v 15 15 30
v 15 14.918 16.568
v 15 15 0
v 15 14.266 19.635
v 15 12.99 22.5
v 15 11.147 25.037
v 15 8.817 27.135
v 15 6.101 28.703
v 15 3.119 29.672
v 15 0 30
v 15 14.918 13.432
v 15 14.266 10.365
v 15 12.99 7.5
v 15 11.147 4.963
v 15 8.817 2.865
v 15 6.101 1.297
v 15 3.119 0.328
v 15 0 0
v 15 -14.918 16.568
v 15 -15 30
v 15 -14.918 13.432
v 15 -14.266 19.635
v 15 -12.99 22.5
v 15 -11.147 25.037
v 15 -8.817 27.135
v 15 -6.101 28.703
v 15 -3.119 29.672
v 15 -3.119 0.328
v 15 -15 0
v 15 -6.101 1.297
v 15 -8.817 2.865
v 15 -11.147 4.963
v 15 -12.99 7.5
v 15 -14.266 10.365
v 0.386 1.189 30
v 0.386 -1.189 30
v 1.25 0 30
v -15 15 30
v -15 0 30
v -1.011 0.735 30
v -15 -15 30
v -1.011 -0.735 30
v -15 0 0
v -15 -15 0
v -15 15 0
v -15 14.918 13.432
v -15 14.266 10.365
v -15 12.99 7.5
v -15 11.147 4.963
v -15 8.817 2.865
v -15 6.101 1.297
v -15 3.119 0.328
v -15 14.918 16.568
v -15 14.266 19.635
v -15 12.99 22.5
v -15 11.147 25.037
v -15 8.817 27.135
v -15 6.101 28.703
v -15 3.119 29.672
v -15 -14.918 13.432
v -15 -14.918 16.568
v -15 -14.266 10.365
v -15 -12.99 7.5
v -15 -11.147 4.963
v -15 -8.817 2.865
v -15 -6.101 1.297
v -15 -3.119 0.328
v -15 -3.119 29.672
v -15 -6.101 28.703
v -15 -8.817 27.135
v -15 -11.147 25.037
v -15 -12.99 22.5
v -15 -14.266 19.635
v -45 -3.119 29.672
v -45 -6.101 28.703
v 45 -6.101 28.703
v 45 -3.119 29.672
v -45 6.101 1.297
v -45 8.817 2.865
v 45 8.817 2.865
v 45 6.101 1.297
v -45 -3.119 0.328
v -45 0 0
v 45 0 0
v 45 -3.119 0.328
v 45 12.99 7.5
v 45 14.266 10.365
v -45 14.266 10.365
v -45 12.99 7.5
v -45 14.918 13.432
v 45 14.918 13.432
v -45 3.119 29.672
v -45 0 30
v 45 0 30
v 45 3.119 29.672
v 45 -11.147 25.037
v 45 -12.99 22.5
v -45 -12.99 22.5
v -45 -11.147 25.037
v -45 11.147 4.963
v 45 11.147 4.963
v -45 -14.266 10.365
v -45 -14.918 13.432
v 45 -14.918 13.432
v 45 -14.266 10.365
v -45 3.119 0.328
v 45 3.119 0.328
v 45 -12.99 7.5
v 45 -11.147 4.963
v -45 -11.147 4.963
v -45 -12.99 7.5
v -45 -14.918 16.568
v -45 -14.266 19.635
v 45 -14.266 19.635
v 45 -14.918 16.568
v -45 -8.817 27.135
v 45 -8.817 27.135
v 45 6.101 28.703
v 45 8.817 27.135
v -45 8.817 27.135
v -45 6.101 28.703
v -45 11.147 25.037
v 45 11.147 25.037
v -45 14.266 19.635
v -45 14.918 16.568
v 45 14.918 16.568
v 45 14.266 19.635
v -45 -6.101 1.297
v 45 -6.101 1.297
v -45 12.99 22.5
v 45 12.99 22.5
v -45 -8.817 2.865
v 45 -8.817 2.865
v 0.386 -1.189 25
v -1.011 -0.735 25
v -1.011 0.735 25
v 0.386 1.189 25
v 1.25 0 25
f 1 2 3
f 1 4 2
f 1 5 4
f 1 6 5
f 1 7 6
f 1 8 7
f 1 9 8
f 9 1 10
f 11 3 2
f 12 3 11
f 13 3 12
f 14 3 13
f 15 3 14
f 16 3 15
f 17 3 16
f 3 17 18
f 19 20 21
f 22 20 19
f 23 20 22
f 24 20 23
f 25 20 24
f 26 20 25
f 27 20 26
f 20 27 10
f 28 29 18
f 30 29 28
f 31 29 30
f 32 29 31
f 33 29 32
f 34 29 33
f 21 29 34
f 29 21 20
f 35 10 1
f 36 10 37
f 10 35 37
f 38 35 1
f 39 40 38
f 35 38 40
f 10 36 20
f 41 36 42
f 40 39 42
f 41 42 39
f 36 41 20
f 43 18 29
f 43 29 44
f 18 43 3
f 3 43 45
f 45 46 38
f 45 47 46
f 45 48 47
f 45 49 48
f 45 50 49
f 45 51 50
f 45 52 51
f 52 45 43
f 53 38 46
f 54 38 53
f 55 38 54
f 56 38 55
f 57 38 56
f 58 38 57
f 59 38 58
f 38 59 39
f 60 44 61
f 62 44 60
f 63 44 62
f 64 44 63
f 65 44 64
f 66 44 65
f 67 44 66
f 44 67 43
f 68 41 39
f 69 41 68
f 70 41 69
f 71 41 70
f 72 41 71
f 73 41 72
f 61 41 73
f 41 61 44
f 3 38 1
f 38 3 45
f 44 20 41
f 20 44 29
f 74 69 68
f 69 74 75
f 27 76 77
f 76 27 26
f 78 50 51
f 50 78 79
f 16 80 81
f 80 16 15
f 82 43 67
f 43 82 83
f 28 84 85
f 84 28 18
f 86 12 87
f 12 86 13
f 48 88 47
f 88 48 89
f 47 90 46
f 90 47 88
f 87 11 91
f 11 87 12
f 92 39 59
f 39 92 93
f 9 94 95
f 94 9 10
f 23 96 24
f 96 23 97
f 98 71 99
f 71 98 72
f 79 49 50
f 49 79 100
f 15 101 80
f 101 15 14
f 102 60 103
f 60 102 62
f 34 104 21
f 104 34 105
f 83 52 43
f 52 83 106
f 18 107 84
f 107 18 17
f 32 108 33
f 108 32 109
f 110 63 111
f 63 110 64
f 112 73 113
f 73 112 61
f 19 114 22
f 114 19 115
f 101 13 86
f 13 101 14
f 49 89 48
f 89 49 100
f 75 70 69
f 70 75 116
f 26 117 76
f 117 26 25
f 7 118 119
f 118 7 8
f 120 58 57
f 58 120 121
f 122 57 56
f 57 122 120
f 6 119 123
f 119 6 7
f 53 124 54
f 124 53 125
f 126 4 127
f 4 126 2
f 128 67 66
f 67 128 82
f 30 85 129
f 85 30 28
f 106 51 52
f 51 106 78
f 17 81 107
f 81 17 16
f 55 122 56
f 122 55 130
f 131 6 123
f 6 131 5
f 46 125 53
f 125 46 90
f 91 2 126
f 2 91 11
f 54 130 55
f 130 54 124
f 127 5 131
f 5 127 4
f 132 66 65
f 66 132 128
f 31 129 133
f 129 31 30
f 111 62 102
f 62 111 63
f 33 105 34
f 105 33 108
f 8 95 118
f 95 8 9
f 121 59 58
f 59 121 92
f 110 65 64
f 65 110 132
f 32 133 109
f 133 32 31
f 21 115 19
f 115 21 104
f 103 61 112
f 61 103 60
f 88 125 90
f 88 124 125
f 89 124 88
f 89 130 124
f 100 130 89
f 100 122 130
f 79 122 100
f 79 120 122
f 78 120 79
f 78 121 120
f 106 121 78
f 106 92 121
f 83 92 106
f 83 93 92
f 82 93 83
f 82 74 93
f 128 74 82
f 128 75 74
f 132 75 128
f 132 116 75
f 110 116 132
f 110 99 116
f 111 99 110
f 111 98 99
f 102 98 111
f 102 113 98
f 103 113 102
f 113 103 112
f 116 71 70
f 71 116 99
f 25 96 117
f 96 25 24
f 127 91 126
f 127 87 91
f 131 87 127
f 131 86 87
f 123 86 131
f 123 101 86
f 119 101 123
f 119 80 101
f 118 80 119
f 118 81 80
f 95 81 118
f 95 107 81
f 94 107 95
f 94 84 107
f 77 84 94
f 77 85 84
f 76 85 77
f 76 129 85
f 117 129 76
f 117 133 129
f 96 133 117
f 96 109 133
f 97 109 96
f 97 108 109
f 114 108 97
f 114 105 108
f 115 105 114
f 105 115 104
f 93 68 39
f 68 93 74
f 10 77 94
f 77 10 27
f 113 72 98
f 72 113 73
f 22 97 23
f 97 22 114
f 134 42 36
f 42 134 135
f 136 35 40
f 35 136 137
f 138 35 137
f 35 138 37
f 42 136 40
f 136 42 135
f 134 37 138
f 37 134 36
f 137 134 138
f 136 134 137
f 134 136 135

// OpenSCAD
cube_size = 30; // [10:Small,20:Medium,30:Large]

hole_diameter = 2.5; 
hole_radius = hole_diameter/2;

// How deep should the center hole be?
hole_depth = 5; // [0,1,5,50]

show_wheels = "yes"; // [yes,no]

// How thick should the side wheels be?
wheel_thickness = 30; // [1:40]

// ignore this variable!
// foo=1;

// don't turn functions into params!
function BEZ03(u) = pow((1-u), 3);

// ignore variable values
bing = 3+4;
baz = 3 / hole_depth;

difference() {
  union() {
    translate([0, 0, cube_size/2]) cube([cube_size,cube_size,cube_size], center=true);
    if (show_wheels == "yes") {
      translate([0, 0, cube_size/2]) rotate([0, 90, 0]) {
        cylinder(r=cube_size/2, h=cube_size+(wheel_thickness*2), center=true);
      }
    }
  }
  translate([0, 0, cube_size-hole_depth]) cylinder(r=hole_radius, h=hole_depth);
}
        
